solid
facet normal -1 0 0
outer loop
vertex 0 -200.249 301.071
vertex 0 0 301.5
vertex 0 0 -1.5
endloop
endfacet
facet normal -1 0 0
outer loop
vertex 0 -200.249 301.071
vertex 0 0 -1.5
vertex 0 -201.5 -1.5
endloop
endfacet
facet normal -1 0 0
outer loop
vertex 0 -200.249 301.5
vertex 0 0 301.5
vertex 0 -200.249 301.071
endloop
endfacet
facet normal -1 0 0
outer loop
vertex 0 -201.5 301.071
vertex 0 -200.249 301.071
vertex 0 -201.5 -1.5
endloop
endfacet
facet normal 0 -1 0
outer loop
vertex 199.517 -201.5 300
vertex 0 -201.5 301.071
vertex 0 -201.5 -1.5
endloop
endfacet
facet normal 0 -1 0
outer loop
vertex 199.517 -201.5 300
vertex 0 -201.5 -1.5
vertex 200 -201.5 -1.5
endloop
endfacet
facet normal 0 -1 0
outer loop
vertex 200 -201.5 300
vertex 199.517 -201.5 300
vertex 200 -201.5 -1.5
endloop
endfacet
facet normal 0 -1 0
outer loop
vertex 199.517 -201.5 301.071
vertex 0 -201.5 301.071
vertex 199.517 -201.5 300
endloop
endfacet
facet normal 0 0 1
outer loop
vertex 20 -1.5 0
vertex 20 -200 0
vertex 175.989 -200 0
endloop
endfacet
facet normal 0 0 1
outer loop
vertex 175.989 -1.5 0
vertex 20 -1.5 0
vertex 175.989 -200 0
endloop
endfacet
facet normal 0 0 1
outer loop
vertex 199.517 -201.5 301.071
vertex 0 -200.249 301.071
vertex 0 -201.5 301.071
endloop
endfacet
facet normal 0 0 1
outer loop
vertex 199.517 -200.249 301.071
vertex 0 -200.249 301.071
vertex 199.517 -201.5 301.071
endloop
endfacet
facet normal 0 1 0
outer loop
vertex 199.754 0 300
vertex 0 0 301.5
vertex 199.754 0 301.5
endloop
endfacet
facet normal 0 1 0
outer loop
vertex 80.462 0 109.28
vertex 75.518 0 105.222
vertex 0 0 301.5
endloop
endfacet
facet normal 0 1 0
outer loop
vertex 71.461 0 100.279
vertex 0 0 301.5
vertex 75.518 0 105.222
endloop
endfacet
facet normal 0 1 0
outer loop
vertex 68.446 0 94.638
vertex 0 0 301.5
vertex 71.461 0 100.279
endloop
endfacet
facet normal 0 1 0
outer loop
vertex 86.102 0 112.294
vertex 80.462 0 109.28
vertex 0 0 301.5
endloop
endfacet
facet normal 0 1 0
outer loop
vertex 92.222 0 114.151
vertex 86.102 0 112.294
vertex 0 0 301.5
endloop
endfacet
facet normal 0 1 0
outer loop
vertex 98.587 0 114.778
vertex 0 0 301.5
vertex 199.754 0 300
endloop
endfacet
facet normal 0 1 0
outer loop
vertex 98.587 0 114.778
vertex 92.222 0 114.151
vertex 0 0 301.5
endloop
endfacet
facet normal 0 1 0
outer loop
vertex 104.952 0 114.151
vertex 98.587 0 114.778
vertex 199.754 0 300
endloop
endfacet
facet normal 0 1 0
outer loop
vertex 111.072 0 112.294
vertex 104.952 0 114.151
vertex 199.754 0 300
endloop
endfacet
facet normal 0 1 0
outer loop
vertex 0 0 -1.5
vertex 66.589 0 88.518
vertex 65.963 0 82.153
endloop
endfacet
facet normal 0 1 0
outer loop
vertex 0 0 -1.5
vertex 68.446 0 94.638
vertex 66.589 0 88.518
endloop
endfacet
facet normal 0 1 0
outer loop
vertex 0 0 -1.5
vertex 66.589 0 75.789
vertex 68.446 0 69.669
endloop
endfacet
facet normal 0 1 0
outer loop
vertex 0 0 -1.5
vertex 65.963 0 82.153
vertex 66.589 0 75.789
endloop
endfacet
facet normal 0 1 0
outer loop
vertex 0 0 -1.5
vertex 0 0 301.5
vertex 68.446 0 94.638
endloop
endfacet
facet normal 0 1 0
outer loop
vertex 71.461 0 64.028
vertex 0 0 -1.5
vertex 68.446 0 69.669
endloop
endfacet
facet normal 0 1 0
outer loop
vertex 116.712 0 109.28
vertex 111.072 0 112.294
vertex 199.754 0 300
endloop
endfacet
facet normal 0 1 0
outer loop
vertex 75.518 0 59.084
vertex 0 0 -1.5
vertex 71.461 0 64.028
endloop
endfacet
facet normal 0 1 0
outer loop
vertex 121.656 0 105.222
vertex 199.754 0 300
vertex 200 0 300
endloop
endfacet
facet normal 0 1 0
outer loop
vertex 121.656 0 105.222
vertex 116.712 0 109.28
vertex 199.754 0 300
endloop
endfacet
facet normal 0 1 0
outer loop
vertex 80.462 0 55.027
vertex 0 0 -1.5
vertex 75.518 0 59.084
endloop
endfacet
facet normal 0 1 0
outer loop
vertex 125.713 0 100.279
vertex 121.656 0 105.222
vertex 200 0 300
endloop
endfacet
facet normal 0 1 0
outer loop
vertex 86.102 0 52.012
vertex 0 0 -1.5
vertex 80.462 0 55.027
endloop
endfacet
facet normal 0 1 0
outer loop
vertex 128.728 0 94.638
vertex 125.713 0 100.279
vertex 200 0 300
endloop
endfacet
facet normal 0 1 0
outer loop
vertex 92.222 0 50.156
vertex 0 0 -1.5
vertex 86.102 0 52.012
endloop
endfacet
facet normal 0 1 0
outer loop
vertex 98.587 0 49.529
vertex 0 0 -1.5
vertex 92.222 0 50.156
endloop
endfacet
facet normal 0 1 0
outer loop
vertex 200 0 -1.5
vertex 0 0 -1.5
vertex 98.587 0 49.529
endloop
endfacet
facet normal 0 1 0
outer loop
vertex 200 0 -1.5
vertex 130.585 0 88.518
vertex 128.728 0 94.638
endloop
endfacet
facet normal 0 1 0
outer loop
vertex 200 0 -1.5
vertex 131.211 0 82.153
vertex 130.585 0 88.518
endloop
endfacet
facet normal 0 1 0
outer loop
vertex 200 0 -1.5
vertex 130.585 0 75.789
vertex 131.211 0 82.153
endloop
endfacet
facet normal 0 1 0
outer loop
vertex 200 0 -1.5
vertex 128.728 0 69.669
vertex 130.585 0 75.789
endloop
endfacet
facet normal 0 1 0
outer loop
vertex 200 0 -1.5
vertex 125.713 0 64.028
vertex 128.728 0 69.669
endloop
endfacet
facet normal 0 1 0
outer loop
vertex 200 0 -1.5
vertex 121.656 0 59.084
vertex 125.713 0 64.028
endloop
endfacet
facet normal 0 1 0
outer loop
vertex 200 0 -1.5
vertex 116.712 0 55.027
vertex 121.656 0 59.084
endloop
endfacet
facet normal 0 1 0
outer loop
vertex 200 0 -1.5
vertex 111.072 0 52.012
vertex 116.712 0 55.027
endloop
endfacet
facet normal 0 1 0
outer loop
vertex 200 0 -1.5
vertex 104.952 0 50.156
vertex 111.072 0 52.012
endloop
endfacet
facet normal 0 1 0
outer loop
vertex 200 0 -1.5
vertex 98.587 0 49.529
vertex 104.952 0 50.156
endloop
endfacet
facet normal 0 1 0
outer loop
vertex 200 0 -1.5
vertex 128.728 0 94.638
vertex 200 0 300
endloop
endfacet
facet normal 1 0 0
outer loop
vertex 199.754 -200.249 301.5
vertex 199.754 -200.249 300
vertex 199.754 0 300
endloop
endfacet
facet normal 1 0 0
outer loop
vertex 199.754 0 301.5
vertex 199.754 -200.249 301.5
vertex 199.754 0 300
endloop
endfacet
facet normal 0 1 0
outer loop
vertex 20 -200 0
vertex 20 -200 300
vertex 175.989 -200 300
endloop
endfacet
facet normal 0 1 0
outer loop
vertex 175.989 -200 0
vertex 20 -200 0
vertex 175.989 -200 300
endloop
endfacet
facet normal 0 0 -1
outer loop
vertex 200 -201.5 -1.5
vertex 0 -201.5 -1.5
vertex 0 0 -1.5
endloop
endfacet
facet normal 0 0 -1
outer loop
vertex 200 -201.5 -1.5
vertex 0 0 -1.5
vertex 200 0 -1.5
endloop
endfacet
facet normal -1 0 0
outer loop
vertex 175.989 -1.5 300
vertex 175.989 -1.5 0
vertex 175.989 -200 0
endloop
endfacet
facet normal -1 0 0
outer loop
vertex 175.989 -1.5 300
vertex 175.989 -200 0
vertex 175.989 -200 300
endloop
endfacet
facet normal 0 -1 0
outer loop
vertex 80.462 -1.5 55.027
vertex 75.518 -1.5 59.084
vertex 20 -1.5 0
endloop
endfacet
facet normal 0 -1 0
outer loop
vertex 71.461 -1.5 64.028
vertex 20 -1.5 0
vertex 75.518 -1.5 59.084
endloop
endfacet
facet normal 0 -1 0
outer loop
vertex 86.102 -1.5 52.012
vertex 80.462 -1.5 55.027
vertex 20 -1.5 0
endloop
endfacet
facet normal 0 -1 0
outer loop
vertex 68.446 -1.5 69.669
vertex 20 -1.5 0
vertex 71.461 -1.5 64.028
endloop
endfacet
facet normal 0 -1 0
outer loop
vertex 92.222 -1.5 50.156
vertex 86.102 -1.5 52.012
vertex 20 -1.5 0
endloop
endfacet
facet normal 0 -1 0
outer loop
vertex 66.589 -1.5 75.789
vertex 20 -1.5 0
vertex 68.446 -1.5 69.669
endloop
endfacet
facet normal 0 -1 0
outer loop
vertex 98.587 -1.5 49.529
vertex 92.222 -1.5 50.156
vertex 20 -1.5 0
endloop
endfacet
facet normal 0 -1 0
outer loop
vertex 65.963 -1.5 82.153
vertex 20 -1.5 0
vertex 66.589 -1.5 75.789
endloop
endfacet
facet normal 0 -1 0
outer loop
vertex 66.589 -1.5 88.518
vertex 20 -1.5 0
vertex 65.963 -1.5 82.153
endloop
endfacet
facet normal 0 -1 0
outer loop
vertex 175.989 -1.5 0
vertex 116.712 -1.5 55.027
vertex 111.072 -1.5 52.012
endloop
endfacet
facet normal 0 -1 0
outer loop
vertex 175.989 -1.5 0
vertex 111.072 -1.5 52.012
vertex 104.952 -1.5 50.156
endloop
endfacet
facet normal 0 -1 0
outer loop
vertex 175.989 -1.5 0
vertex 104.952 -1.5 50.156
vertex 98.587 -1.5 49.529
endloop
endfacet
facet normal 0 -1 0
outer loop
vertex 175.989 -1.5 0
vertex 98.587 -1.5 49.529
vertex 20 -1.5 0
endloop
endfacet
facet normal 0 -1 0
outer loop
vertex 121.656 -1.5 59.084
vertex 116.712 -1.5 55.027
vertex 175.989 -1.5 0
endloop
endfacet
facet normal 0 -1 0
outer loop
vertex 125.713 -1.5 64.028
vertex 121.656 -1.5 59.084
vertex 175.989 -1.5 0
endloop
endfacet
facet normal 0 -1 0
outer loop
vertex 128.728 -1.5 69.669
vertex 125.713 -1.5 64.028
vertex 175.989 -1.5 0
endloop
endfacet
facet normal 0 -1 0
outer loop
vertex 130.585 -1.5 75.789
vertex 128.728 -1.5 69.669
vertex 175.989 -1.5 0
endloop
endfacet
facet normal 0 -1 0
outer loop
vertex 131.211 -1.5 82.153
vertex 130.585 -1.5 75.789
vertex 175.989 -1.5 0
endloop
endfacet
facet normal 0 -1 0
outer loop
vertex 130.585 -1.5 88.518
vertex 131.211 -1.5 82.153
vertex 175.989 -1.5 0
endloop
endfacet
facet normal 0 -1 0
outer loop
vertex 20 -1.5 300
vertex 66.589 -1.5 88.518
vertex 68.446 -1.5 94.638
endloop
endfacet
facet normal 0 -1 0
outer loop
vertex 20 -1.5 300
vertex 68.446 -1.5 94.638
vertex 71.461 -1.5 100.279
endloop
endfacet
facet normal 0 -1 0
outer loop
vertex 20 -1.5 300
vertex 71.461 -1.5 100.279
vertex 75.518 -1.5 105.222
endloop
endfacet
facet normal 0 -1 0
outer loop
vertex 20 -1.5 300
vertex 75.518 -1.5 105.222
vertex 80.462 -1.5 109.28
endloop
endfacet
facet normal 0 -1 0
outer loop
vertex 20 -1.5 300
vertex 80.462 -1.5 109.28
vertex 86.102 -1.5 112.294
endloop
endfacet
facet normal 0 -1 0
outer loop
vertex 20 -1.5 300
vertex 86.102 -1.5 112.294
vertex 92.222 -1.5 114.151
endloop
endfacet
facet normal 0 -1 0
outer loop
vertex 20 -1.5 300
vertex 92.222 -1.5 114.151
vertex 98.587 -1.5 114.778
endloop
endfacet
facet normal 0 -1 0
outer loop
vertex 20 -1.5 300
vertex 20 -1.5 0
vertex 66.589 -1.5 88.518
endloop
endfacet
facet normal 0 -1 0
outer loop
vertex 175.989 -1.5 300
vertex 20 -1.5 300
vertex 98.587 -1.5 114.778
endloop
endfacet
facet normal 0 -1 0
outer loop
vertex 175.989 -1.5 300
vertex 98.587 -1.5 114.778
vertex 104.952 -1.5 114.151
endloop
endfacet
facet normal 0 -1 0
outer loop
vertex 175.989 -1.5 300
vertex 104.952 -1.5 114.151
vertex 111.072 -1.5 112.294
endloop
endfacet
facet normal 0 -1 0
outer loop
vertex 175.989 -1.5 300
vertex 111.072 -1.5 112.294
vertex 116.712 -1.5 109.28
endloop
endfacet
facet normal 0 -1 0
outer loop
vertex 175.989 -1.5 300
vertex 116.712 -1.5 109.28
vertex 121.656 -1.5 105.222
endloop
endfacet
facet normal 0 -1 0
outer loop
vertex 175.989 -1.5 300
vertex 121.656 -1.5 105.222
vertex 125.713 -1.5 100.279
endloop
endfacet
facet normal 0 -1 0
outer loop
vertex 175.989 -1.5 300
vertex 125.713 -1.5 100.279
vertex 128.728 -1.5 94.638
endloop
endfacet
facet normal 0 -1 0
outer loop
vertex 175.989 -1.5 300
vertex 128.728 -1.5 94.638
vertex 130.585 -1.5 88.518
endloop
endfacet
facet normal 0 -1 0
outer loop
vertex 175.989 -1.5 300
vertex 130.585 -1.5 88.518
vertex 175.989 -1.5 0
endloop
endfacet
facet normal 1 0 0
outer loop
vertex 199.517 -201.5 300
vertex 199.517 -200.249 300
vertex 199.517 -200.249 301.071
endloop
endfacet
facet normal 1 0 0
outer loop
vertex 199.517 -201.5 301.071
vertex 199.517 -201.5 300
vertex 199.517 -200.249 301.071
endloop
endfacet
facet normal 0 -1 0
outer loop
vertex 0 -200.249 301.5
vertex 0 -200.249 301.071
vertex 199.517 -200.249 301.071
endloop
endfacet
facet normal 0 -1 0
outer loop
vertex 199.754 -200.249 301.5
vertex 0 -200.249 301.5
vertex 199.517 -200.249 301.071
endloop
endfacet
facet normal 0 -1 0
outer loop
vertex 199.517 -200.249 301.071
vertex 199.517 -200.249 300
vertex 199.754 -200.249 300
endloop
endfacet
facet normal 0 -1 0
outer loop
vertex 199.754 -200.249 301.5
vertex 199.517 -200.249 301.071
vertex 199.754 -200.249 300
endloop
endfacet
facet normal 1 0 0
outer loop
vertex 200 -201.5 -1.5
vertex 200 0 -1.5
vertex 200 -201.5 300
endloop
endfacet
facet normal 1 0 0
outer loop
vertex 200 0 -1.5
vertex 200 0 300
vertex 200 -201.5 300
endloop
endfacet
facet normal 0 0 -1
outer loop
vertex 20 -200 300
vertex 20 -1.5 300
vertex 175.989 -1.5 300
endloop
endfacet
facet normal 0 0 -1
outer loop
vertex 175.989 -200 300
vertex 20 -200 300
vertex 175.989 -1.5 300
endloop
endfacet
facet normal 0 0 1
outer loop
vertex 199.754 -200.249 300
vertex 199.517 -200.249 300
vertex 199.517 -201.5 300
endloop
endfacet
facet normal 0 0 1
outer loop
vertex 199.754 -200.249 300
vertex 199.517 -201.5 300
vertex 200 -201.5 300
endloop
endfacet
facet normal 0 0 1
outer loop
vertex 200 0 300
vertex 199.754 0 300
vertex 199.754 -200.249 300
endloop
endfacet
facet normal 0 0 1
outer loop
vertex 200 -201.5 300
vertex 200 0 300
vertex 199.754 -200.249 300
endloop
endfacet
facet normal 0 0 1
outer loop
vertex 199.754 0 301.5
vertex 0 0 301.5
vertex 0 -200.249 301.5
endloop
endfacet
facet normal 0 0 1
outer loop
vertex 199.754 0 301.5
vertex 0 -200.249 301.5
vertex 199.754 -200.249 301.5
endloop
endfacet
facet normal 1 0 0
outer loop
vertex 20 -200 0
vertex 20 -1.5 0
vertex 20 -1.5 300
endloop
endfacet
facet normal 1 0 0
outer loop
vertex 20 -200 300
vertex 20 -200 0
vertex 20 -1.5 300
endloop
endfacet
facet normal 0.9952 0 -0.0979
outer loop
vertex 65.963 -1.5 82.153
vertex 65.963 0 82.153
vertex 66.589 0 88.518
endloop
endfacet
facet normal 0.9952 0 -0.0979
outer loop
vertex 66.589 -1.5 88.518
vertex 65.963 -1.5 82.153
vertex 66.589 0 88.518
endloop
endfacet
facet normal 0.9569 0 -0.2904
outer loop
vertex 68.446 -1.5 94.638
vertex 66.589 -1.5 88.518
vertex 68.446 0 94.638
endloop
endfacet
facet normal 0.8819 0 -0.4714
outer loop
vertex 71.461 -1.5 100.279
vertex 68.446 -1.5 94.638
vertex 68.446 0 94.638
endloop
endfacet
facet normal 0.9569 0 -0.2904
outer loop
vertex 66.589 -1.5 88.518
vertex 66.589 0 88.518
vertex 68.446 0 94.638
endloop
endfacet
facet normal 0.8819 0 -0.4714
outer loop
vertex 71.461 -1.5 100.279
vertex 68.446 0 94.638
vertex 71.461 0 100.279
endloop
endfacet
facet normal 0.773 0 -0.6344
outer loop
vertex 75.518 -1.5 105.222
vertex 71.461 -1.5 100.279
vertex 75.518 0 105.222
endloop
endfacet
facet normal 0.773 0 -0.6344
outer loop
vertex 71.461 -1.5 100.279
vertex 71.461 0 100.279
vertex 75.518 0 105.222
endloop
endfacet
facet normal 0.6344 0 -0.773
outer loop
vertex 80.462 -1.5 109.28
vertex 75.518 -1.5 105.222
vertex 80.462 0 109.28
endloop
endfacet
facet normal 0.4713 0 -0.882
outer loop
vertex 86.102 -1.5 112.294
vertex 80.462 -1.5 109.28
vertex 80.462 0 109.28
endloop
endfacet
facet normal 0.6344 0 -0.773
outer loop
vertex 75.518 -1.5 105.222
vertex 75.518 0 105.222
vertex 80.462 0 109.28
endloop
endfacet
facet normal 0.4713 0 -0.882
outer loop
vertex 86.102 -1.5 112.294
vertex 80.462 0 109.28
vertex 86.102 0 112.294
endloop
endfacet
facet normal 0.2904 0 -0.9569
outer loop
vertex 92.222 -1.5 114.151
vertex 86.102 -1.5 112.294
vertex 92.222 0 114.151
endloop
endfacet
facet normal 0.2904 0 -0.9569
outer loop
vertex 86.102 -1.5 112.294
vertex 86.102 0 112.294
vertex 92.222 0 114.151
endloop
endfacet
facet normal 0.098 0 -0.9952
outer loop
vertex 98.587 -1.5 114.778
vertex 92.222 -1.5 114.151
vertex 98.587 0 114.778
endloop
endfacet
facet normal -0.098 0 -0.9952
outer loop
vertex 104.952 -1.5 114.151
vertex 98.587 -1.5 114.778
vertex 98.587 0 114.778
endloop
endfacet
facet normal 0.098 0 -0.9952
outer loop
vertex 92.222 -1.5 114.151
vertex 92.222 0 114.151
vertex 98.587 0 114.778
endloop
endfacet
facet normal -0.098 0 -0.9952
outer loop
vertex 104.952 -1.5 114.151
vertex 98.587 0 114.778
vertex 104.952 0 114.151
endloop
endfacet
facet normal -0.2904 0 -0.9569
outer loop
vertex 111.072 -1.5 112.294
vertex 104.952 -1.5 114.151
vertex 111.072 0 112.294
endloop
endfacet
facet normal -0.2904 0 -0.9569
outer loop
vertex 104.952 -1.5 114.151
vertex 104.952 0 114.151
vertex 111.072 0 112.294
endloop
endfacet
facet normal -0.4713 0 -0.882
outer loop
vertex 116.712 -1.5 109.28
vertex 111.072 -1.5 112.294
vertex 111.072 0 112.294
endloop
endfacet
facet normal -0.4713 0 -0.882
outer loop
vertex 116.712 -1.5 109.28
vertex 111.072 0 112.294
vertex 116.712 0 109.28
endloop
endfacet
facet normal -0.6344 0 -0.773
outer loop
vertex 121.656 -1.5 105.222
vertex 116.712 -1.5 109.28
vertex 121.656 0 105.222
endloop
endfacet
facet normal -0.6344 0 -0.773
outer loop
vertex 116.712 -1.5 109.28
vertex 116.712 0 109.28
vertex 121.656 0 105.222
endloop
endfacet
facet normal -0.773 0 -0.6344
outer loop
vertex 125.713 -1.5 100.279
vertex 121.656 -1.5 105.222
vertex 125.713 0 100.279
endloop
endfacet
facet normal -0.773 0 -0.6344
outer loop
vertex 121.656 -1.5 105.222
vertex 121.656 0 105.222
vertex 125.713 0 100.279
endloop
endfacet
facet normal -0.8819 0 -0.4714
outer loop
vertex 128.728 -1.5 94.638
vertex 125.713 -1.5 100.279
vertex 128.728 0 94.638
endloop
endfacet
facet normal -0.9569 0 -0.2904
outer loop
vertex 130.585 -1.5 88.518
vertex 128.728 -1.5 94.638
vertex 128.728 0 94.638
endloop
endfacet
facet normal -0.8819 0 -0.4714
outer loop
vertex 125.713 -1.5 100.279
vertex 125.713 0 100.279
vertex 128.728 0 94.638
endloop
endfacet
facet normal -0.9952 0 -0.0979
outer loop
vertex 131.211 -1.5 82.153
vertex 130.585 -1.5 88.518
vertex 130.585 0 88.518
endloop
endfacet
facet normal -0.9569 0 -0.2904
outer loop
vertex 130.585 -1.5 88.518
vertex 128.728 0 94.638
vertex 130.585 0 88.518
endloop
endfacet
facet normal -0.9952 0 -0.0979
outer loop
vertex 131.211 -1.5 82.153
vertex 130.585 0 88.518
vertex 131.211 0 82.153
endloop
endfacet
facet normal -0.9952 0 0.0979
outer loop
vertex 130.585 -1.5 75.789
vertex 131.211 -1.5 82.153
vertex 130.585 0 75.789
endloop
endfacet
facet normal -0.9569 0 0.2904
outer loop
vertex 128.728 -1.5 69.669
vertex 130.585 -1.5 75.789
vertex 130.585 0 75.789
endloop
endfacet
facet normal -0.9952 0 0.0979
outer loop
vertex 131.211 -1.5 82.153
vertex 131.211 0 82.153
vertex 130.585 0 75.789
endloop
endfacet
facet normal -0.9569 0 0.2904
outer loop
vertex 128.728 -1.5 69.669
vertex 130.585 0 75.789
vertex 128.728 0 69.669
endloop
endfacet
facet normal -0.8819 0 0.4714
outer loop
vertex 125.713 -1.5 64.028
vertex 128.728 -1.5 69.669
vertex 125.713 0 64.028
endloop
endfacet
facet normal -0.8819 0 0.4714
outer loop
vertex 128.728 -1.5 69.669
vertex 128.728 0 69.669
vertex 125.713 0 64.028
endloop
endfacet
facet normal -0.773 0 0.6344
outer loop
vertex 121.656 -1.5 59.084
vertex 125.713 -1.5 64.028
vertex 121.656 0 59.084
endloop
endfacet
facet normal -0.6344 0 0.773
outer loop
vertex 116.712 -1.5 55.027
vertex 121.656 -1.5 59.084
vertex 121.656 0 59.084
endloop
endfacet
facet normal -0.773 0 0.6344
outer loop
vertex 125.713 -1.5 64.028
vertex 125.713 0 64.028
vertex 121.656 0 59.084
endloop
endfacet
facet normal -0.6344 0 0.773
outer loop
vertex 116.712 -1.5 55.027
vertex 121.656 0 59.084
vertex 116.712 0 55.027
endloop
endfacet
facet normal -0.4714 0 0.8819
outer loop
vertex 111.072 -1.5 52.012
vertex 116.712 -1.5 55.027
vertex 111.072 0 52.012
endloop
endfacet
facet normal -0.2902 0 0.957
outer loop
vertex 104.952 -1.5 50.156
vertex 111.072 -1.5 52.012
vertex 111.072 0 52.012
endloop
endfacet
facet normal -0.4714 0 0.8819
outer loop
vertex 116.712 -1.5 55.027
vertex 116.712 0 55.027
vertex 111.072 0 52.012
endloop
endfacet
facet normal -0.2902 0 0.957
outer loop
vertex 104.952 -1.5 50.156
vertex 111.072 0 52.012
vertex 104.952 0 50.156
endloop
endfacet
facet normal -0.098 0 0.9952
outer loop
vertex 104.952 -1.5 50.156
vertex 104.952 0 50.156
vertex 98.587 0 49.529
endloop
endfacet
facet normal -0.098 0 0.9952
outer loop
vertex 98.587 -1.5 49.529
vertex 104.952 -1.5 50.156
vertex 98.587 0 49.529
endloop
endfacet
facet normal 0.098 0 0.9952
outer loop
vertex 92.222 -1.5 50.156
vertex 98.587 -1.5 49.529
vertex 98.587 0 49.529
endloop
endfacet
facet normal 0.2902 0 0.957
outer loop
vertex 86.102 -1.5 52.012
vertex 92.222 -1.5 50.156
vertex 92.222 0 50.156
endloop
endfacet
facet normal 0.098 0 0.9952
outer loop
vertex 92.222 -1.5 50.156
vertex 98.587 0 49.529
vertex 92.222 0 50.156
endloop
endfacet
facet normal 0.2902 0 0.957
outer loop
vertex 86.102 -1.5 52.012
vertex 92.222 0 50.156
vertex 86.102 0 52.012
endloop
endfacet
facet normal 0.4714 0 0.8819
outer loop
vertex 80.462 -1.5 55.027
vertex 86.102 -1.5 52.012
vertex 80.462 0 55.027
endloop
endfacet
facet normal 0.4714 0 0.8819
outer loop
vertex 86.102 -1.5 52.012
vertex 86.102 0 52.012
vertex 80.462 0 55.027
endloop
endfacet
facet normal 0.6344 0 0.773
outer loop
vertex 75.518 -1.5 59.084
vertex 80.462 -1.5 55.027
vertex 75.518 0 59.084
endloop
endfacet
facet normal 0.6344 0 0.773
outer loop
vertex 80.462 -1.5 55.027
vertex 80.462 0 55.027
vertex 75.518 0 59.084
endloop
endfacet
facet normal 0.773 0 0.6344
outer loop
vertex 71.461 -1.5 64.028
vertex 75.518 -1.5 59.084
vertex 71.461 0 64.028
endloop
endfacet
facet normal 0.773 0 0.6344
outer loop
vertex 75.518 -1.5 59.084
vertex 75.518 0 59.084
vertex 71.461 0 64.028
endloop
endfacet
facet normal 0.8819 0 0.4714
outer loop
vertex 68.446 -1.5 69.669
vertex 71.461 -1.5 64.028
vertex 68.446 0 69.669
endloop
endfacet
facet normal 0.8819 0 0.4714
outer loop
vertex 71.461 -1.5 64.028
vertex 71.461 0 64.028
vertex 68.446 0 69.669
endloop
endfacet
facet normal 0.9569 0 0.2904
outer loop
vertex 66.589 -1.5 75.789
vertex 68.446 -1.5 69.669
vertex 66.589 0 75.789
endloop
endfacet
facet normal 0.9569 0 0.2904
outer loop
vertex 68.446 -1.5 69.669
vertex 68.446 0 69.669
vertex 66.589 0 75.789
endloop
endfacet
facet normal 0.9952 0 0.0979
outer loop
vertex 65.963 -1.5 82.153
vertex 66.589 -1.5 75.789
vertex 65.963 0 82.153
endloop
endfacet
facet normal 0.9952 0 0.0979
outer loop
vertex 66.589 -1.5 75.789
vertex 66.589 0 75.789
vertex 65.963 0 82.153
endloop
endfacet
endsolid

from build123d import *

# Parameters (mm, degrees)
F0_W      = 200
F0_H      = 300
F1_DEPTH  = 1.5
F2_W      = 20
F2_H      = 300
F3_DEPTH  = 200
F4_W      = 24.0114152431
F4_H      = 300
F5_DEPTH  = 200
F6_W      = 199.5166987181
F6_H      = 301.0709583759
F7_DEPTH  = 1.5
F9_R      = 32.6244324659
F10_DEPTH = 1.5
F11_W     = 200
F11_H     = 201.5
F12_DEPTH = 1.5
F13_W     = 199.7538208961
F13_H     = 200.2487033606
F14_DEPTH = 1.5


with BuildPart() as f1:
    # F0 (on Front) → F1 (new body)
    with BuildSketch(Plane.XZ):
        with Locations((100, 150)):
            Rectangle(F0_W, F0_H)
    extrude(amount=F1_DEPTH)

    # F2 (on Front) → F3 (join)
    with BuildSketch(Plane.XZ):
        with Locations((10, 150)):
            Rectangle(F2_W, F2_H)
    extrude(amount=F3_DEPTH)

    # F4 (on face) → F5 (join)
    with BuildSketch(Plane.XZ.offset(1.5)):
        with Locations((187.9942923784, 150)):
            Rectangle(F4_W, F4_H)
    extrude(amount=F5_DEPTH)

    # F6 (on face) → F7 (join)
    with BuildSketch(Plane.XZ.offset(200)):
        with Locations((99.758349359, 150.535479188)):
            Rectangle(F6_W, F6_H)
    extrude(amount=F7_DEPTH)

    # F9 (on face) → F10 (cut)
    with BuildSketch(Plane(origin=(0, 0, 0), x_dir=(-1, 0, 0), z_dir=(0, 1, 0))):
        with Locations((-98.5869541764, 82.1533799171)):
            Circle(F9_R)
    extrude(amount=-F10_DEPTH, mode=Mode.SUBTRACT)

    # F11 (on face) → F12 (join)
    with BuildSketch(Plane(origin=(0, 0, 0), x_dir=(1, 0, 0), z_dir=(0, 0, -1))):
        with Locations((100, 100.75)):
            Rectangle(F11_W, F11_H)
    extrude(amount=F12_DEPTH)

    # F13 (on face) → F14 (join)
    with BuildSketch(Plane.XY.offset(300)):
        with Locations((99.8769104481, -100.1243516803)):
            Rectangle(F13_W, F13_H)
    extrude(amount=F14_DEPTH)


solid = f1.part
